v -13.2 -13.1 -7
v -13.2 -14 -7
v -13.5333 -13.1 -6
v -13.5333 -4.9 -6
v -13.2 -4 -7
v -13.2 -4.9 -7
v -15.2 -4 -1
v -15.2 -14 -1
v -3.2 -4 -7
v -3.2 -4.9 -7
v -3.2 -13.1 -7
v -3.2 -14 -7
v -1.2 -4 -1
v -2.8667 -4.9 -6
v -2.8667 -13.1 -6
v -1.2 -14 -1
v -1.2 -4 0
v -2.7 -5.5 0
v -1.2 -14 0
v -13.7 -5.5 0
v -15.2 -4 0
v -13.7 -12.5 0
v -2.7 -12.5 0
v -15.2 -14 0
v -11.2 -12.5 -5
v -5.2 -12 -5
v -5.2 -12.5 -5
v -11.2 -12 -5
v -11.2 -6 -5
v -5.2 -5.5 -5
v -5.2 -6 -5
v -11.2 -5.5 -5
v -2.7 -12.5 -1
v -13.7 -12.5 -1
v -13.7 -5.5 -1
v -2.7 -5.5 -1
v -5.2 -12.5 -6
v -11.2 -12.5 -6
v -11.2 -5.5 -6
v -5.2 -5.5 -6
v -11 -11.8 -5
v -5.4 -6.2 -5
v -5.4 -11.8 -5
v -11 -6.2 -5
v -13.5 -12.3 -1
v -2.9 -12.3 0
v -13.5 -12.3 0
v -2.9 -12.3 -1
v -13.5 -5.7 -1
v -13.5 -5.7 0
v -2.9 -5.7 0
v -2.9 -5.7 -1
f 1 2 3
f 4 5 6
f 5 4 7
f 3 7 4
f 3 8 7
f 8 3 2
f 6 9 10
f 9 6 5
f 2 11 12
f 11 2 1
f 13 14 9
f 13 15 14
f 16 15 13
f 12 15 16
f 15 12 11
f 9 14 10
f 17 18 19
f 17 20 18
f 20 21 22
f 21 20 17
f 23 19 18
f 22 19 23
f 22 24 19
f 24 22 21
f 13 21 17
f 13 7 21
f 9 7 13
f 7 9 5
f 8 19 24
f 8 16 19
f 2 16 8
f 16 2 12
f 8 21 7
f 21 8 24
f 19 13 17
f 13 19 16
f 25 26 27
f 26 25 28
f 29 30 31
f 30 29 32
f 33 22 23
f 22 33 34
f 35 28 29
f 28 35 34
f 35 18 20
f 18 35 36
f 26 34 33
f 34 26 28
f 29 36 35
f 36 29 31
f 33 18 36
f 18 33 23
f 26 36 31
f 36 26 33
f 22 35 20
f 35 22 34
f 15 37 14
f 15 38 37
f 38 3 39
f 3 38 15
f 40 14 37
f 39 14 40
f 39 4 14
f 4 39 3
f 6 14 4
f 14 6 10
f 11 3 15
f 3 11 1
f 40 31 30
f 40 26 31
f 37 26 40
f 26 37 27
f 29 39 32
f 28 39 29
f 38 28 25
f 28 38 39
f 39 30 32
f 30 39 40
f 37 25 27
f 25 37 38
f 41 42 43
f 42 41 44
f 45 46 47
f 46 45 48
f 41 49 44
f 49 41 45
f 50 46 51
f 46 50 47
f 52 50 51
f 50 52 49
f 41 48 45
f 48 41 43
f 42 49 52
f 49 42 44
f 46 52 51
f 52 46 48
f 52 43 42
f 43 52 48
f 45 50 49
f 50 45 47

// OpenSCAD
corr=0.2;
$fn=60;
linear_extrude(3)import("C:/src/Tennp/Git/PortableSpeaker/SCAD/Bat.dxf");


translate([-8.2,-9,0])difference(){
    color("gray")hull(){
        translate([0,0,-7])case_base();
        translate([0,0,-1])chg_case_top();
    }
    chg_body(0);
    translate([0,0,-7])cube([15,8.2,2],true);
    translate([0,0,-7])cube([6,7,4],true);

}

linear_extrude(3)import("C:/src/Tennp/Git/PortableSpeaker/SCAD/Charging.dxf");
translate([-8.2,-9,0])chg_body(-0.4);

//allleds();


module chg_body(a){
    hull(){
        translate([0,0,-5])linear_extrude(1)square([6+a,6+a],true);
        translate([0,0,-1])linear_extrude(1)square([11+a,7+a],true);
    }
}

module case_base(){
    color("gray")linear_extrude(2)square(10,true);
}

module chg_case_top(){
    color("gray")linear_extrude(1)square([14,10],true);
}

module allleds(){
    for(i=[-9:6:9])translate([i,0,-6])led();
    color("green")translate([0,0,-1.6/2-6])cube([33,8,1.6],true);
    color("green")translate([-8.2,-9,-1.6/2-6])cube([15,8,1.6],true);


    translate([-8.2,-9,-6])led();
}

module led(){
    color("white")linear_extrude(1.5)square(5.2,true);
}
